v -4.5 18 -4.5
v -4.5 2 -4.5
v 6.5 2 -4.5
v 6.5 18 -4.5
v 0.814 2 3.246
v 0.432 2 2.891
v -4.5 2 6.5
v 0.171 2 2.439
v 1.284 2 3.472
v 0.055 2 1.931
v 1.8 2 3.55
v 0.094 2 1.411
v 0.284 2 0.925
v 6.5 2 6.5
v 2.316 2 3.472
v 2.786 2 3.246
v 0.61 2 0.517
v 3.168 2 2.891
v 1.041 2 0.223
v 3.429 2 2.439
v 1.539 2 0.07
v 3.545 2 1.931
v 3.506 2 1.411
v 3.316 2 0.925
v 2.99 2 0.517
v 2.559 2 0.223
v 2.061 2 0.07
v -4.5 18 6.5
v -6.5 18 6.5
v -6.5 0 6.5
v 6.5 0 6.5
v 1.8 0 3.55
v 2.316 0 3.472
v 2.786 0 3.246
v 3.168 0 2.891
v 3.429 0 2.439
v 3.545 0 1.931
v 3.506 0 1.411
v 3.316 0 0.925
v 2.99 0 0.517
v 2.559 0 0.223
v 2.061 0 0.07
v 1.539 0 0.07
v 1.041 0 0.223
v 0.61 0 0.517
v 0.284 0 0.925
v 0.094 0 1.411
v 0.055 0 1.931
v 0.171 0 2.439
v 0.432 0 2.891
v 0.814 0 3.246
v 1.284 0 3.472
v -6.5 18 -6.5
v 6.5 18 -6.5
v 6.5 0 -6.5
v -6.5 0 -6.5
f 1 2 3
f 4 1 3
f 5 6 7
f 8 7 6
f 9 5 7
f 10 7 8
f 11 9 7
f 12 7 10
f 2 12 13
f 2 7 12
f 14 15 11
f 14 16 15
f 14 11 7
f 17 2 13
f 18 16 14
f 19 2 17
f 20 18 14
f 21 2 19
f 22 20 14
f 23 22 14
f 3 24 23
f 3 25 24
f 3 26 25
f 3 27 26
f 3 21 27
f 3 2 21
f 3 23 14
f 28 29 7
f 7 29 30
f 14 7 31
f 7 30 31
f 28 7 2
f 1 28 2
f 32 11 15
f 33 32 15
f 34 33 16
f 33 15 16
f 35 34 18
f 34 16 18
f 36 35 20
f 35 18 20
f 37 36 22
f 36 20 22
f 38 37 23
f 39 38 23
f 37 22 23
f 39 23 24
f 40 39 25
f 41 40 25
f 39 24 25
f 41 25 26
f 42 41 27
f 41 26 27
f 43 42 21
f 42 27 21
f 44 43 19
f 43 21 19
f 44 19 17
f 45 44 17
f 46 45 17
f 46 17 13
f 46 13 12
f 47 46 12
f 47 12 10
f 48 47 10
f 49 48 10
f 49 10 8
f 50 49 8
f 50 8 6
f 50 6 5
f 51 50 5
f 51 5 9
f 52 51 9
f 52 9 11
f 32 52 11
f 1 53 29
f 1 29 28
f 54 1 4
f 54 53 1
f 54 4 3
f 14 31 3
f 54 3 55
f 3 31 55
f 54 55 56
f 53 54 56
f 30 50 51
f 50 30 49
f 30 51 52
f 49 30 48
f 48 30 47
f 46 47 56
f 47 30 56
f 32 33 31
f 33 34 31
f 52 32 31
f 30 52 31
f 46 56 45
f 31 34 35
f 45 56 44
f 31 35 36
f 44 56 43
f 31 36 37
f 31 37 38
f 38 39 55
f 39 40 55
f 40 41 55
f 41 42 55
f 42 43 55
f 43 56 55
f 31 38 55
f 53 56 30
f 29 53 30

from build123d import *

# Parameters (mm, degrees)
SKETCH1_W           = 13
SKETCH1_H           = 13
BOSS_EXTRUDE1_DEPTH = 2
BOSS_EXTRUDE2_DEPTH = 16
SKETCH3_R           = 1.75
CUT_EXTRUDE1_DEPTH  = 20


with BuildPart() as part:
    # Sketch1 → Boss-Extrude1 (new body)
    with BuildSketch(Plane(origin=(0, 0, 0), x_dir=(1, 0, 0), z_dir=(0, 1, 0))):
        Rectangle(SKETCH1_W, SKETCH1_H)
    extrude(amount=BOSS_EXTRUDE1_DEPTH)

    # Sketch2 → Boss-Extrude2 (add)
    with BuildSketch(Plane(origin=(0, 2, 0), x_dir=(1, 0, 0), z_dir=(0, 1, 0))):
        Polygon((-6.5, 6.5), (-6.5, -6.5), (-4.5, -6.5), (-4.5, 4.5), (6.5, 4.5), (6.5, 6.5), align=None)
    extrude(amount=BOSS_EXTRUDE2_DEPTH)

    # Sketch3 → Cut-Extrude1 (cut)
    with BuildSketch(Plane(origin=(0, 2, 0), x_dir=(1, 0, 0), z_dir=(0, 1, 0))):
        with Locations(Location((1.8, -1.8, 0), (0, 0, 270))):
            Circle(SKETCH3_R)
    extrude(amount=-CUT_EXTRUDE1_DEPTH, mode=Mode.SUBTRACT)


solid = part.part
